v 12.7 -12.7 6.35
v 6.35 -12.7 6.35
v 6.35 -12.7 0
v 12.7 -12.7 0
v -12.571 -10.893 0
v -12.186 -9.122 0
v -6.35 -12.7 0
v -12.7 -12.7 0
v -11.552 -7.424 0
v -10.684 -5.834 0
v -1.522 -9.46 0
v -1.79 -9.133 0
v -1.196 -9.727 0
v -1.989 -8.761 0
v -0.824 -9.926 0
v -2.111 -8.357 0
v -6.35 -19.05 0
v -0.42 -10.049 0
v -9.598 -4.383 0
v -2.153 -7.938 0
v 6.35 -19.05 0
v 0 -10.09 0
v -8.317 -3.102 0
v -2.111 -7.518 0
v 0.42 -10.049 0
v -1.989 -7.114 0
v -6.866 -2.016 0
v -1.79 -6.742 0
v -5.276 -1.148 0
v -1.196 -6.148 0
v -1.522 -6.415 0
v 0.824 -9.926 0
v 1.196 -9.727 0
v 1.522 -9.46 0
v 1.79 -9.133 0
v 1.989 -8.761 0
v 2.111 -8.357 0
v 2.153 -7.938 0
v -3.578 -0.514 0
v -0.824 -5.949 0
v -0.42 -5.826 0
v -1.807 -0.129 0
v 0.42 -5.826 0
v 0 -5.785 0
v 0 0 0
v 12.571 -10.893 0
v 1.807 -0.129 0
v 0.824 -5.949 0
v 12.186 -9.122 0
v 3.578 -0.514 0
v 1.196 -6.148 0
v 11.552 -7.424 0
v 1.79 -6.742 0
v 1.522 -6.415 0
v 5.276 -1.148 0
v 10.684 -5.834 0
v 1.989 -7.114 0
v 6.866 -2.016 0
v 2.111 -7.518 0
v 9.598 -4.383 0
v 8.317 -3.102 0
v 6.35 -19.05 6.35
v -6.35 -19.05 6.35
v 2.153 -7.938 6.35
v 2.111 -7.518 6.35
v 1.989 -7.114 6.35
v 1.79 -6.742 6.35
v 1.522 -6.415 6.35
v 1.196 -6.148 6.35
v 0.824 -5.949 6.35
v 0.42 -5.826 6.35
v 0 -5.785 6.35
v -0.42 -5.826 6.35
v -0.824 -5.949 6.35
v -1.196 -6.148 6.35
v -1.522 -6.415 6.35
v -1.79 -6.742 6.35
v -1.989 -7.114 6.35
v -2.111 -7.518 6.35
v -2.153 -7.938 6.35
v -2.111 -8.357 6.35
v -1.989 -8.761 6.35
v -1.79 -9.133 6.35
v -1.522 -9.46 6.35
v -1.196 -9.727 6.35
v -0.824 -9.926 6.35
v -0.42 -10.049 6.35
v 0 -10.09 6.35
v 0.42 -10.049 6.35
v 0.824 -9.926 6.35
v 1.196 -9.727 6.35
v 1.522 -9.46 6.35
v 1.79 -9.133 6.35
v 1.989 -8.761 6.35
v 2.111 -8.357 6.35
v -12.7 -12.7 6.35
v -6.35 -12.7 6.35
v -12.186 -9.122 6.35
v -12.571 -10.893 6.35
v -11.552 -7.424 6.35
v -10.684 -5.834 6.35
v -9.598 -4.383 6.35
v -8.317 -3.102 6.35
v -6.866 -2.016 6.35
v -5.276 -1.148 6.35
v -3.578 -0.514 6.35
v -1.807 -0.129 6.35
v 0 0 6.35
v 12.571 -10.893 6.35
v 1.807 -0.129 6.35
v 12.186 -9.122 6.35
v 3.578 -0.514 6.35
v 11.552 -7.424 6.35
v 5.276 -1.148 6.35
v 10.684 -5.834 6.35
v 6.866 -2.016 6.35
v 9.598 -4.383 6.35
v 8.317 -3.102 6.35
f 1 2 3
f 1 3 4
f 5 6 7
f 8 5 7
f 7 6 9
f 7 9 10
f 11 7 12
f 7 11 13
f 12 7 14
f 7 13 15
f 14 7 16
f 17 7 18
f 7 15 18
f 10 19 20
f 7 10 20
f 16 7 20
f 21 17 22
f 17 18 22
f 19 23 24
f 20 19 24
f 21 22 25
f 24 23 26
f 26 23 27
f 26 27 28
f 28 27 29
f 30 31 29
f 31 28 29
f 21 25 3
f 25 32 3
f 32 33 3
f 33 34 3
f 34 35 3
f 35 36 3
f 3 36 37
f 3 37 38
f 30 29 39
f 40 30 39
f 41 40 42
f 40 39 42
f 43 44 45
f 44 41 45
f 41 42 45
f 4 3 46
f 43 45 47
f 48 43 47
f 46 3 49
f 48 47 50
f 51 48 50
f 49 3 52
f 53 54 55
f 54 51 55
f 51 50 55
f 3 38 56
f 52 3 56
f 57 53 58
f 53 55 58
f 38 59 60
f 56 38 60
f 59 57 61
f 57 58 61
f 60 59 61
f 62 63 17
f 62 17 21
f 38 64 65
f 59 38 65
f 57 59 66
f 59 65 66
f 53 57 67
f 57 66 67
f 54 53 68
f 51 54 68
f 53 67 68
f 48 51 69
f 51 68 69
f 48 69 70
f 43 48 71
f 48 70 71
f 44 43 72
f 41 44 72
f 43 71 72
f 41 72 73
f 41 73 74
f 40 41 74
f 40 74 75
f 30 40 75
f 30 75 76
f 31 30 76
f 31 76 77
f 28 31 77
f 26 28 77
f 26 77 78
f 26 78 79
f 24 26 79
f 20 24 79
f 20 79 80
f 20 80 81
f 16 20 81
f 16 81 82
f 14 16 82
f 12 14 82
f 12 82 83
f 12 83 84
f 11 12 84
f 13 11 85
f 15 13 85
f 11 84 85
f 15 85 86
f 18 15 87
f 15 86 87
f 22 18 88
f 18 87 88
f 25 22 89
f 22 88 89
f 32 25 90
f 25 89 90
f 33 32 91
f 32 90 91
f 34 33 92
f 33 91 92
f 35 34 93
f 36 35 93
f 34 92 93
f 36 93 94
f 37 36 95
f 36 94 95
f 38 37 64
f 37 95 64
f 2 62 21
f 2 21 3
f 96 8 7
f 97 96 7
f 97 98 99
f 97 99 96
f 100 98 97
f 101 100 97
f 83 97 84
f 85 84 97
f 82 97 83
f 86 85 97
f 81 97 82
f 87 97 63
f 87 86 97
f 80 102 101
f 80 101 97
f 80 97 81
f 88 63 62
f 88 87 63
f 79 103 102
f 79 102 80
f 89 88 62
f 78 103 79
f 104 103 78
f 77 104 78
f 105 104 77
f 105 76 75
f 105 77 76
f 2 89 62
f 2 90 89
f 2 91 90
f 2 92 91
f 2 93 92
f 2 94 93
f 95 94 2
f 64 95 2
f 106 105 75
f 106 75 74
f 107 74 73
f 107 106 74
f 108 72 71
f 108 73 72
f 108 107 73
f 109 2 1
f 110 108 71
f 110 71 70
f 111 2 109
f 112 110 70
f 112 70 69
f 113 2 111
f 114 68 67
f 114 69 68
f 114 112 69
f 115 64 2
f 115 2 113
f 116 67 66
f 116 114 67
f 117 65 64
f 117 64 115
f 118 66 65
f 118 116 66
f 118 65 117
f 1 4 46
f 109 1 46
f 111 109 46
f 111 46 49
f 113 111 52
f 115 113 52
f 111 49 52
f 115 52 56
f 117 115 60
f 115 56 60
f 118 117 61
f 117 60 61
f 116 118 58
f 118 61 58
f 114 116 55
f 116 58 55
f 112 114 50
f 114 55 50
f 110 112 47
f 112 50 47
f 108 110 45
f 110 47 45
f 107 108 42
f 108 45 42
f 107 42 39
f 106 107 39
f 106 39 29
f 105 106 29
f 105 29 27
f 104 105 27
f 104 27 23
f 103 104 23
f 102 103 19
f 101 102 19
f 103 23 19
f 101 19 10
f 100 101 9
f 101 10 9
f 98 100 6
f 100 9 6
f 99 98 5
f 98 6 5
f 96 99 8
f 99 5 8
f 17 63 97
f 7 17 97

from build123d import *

# Parameters (mm, degrees)
BASE_DEPTH          = 6.35
AXLE_HOLE_D         = 4.3053
SKETCH8_W           = 12.7
SKETCH8_H           = 6.35
BOSS_EXTRUDE2_DEPTH = 6.35


with BuildPart() as part:
    # Sketch1 → Base (new body)
    with BuildSketch(Plane.XY):
        with BuildLine():
            Line((-12.7, -12.7), (12.7, -12.7))
            ThreePointArc((12.7, -12.7), (0, 0), (-12.7, -12.7))
        make_face()
    extrude(amount=BASE_DEPTH)

    # Axle hole (through all)
    with Locations(Plane(origin=(0, 0, 0), x_dir=(-1, 0, 0), z_dir=(0, 0, -1))):
        with Locations((0, -7.9375)):
            Hole(AXLE_HOLE_D / 2)

    # Sketch8 → Boss-Extrude2 (add)
    with BuildSketch(Plane.XY.offset(6.35)):
        with Locations((0, -15.875)):
            Rectangle(SKETCH8_W, SKETCH8_H)
    extrude(amount=-BOSS_EXTRUDE2_DEPTH)


solid = part.part
